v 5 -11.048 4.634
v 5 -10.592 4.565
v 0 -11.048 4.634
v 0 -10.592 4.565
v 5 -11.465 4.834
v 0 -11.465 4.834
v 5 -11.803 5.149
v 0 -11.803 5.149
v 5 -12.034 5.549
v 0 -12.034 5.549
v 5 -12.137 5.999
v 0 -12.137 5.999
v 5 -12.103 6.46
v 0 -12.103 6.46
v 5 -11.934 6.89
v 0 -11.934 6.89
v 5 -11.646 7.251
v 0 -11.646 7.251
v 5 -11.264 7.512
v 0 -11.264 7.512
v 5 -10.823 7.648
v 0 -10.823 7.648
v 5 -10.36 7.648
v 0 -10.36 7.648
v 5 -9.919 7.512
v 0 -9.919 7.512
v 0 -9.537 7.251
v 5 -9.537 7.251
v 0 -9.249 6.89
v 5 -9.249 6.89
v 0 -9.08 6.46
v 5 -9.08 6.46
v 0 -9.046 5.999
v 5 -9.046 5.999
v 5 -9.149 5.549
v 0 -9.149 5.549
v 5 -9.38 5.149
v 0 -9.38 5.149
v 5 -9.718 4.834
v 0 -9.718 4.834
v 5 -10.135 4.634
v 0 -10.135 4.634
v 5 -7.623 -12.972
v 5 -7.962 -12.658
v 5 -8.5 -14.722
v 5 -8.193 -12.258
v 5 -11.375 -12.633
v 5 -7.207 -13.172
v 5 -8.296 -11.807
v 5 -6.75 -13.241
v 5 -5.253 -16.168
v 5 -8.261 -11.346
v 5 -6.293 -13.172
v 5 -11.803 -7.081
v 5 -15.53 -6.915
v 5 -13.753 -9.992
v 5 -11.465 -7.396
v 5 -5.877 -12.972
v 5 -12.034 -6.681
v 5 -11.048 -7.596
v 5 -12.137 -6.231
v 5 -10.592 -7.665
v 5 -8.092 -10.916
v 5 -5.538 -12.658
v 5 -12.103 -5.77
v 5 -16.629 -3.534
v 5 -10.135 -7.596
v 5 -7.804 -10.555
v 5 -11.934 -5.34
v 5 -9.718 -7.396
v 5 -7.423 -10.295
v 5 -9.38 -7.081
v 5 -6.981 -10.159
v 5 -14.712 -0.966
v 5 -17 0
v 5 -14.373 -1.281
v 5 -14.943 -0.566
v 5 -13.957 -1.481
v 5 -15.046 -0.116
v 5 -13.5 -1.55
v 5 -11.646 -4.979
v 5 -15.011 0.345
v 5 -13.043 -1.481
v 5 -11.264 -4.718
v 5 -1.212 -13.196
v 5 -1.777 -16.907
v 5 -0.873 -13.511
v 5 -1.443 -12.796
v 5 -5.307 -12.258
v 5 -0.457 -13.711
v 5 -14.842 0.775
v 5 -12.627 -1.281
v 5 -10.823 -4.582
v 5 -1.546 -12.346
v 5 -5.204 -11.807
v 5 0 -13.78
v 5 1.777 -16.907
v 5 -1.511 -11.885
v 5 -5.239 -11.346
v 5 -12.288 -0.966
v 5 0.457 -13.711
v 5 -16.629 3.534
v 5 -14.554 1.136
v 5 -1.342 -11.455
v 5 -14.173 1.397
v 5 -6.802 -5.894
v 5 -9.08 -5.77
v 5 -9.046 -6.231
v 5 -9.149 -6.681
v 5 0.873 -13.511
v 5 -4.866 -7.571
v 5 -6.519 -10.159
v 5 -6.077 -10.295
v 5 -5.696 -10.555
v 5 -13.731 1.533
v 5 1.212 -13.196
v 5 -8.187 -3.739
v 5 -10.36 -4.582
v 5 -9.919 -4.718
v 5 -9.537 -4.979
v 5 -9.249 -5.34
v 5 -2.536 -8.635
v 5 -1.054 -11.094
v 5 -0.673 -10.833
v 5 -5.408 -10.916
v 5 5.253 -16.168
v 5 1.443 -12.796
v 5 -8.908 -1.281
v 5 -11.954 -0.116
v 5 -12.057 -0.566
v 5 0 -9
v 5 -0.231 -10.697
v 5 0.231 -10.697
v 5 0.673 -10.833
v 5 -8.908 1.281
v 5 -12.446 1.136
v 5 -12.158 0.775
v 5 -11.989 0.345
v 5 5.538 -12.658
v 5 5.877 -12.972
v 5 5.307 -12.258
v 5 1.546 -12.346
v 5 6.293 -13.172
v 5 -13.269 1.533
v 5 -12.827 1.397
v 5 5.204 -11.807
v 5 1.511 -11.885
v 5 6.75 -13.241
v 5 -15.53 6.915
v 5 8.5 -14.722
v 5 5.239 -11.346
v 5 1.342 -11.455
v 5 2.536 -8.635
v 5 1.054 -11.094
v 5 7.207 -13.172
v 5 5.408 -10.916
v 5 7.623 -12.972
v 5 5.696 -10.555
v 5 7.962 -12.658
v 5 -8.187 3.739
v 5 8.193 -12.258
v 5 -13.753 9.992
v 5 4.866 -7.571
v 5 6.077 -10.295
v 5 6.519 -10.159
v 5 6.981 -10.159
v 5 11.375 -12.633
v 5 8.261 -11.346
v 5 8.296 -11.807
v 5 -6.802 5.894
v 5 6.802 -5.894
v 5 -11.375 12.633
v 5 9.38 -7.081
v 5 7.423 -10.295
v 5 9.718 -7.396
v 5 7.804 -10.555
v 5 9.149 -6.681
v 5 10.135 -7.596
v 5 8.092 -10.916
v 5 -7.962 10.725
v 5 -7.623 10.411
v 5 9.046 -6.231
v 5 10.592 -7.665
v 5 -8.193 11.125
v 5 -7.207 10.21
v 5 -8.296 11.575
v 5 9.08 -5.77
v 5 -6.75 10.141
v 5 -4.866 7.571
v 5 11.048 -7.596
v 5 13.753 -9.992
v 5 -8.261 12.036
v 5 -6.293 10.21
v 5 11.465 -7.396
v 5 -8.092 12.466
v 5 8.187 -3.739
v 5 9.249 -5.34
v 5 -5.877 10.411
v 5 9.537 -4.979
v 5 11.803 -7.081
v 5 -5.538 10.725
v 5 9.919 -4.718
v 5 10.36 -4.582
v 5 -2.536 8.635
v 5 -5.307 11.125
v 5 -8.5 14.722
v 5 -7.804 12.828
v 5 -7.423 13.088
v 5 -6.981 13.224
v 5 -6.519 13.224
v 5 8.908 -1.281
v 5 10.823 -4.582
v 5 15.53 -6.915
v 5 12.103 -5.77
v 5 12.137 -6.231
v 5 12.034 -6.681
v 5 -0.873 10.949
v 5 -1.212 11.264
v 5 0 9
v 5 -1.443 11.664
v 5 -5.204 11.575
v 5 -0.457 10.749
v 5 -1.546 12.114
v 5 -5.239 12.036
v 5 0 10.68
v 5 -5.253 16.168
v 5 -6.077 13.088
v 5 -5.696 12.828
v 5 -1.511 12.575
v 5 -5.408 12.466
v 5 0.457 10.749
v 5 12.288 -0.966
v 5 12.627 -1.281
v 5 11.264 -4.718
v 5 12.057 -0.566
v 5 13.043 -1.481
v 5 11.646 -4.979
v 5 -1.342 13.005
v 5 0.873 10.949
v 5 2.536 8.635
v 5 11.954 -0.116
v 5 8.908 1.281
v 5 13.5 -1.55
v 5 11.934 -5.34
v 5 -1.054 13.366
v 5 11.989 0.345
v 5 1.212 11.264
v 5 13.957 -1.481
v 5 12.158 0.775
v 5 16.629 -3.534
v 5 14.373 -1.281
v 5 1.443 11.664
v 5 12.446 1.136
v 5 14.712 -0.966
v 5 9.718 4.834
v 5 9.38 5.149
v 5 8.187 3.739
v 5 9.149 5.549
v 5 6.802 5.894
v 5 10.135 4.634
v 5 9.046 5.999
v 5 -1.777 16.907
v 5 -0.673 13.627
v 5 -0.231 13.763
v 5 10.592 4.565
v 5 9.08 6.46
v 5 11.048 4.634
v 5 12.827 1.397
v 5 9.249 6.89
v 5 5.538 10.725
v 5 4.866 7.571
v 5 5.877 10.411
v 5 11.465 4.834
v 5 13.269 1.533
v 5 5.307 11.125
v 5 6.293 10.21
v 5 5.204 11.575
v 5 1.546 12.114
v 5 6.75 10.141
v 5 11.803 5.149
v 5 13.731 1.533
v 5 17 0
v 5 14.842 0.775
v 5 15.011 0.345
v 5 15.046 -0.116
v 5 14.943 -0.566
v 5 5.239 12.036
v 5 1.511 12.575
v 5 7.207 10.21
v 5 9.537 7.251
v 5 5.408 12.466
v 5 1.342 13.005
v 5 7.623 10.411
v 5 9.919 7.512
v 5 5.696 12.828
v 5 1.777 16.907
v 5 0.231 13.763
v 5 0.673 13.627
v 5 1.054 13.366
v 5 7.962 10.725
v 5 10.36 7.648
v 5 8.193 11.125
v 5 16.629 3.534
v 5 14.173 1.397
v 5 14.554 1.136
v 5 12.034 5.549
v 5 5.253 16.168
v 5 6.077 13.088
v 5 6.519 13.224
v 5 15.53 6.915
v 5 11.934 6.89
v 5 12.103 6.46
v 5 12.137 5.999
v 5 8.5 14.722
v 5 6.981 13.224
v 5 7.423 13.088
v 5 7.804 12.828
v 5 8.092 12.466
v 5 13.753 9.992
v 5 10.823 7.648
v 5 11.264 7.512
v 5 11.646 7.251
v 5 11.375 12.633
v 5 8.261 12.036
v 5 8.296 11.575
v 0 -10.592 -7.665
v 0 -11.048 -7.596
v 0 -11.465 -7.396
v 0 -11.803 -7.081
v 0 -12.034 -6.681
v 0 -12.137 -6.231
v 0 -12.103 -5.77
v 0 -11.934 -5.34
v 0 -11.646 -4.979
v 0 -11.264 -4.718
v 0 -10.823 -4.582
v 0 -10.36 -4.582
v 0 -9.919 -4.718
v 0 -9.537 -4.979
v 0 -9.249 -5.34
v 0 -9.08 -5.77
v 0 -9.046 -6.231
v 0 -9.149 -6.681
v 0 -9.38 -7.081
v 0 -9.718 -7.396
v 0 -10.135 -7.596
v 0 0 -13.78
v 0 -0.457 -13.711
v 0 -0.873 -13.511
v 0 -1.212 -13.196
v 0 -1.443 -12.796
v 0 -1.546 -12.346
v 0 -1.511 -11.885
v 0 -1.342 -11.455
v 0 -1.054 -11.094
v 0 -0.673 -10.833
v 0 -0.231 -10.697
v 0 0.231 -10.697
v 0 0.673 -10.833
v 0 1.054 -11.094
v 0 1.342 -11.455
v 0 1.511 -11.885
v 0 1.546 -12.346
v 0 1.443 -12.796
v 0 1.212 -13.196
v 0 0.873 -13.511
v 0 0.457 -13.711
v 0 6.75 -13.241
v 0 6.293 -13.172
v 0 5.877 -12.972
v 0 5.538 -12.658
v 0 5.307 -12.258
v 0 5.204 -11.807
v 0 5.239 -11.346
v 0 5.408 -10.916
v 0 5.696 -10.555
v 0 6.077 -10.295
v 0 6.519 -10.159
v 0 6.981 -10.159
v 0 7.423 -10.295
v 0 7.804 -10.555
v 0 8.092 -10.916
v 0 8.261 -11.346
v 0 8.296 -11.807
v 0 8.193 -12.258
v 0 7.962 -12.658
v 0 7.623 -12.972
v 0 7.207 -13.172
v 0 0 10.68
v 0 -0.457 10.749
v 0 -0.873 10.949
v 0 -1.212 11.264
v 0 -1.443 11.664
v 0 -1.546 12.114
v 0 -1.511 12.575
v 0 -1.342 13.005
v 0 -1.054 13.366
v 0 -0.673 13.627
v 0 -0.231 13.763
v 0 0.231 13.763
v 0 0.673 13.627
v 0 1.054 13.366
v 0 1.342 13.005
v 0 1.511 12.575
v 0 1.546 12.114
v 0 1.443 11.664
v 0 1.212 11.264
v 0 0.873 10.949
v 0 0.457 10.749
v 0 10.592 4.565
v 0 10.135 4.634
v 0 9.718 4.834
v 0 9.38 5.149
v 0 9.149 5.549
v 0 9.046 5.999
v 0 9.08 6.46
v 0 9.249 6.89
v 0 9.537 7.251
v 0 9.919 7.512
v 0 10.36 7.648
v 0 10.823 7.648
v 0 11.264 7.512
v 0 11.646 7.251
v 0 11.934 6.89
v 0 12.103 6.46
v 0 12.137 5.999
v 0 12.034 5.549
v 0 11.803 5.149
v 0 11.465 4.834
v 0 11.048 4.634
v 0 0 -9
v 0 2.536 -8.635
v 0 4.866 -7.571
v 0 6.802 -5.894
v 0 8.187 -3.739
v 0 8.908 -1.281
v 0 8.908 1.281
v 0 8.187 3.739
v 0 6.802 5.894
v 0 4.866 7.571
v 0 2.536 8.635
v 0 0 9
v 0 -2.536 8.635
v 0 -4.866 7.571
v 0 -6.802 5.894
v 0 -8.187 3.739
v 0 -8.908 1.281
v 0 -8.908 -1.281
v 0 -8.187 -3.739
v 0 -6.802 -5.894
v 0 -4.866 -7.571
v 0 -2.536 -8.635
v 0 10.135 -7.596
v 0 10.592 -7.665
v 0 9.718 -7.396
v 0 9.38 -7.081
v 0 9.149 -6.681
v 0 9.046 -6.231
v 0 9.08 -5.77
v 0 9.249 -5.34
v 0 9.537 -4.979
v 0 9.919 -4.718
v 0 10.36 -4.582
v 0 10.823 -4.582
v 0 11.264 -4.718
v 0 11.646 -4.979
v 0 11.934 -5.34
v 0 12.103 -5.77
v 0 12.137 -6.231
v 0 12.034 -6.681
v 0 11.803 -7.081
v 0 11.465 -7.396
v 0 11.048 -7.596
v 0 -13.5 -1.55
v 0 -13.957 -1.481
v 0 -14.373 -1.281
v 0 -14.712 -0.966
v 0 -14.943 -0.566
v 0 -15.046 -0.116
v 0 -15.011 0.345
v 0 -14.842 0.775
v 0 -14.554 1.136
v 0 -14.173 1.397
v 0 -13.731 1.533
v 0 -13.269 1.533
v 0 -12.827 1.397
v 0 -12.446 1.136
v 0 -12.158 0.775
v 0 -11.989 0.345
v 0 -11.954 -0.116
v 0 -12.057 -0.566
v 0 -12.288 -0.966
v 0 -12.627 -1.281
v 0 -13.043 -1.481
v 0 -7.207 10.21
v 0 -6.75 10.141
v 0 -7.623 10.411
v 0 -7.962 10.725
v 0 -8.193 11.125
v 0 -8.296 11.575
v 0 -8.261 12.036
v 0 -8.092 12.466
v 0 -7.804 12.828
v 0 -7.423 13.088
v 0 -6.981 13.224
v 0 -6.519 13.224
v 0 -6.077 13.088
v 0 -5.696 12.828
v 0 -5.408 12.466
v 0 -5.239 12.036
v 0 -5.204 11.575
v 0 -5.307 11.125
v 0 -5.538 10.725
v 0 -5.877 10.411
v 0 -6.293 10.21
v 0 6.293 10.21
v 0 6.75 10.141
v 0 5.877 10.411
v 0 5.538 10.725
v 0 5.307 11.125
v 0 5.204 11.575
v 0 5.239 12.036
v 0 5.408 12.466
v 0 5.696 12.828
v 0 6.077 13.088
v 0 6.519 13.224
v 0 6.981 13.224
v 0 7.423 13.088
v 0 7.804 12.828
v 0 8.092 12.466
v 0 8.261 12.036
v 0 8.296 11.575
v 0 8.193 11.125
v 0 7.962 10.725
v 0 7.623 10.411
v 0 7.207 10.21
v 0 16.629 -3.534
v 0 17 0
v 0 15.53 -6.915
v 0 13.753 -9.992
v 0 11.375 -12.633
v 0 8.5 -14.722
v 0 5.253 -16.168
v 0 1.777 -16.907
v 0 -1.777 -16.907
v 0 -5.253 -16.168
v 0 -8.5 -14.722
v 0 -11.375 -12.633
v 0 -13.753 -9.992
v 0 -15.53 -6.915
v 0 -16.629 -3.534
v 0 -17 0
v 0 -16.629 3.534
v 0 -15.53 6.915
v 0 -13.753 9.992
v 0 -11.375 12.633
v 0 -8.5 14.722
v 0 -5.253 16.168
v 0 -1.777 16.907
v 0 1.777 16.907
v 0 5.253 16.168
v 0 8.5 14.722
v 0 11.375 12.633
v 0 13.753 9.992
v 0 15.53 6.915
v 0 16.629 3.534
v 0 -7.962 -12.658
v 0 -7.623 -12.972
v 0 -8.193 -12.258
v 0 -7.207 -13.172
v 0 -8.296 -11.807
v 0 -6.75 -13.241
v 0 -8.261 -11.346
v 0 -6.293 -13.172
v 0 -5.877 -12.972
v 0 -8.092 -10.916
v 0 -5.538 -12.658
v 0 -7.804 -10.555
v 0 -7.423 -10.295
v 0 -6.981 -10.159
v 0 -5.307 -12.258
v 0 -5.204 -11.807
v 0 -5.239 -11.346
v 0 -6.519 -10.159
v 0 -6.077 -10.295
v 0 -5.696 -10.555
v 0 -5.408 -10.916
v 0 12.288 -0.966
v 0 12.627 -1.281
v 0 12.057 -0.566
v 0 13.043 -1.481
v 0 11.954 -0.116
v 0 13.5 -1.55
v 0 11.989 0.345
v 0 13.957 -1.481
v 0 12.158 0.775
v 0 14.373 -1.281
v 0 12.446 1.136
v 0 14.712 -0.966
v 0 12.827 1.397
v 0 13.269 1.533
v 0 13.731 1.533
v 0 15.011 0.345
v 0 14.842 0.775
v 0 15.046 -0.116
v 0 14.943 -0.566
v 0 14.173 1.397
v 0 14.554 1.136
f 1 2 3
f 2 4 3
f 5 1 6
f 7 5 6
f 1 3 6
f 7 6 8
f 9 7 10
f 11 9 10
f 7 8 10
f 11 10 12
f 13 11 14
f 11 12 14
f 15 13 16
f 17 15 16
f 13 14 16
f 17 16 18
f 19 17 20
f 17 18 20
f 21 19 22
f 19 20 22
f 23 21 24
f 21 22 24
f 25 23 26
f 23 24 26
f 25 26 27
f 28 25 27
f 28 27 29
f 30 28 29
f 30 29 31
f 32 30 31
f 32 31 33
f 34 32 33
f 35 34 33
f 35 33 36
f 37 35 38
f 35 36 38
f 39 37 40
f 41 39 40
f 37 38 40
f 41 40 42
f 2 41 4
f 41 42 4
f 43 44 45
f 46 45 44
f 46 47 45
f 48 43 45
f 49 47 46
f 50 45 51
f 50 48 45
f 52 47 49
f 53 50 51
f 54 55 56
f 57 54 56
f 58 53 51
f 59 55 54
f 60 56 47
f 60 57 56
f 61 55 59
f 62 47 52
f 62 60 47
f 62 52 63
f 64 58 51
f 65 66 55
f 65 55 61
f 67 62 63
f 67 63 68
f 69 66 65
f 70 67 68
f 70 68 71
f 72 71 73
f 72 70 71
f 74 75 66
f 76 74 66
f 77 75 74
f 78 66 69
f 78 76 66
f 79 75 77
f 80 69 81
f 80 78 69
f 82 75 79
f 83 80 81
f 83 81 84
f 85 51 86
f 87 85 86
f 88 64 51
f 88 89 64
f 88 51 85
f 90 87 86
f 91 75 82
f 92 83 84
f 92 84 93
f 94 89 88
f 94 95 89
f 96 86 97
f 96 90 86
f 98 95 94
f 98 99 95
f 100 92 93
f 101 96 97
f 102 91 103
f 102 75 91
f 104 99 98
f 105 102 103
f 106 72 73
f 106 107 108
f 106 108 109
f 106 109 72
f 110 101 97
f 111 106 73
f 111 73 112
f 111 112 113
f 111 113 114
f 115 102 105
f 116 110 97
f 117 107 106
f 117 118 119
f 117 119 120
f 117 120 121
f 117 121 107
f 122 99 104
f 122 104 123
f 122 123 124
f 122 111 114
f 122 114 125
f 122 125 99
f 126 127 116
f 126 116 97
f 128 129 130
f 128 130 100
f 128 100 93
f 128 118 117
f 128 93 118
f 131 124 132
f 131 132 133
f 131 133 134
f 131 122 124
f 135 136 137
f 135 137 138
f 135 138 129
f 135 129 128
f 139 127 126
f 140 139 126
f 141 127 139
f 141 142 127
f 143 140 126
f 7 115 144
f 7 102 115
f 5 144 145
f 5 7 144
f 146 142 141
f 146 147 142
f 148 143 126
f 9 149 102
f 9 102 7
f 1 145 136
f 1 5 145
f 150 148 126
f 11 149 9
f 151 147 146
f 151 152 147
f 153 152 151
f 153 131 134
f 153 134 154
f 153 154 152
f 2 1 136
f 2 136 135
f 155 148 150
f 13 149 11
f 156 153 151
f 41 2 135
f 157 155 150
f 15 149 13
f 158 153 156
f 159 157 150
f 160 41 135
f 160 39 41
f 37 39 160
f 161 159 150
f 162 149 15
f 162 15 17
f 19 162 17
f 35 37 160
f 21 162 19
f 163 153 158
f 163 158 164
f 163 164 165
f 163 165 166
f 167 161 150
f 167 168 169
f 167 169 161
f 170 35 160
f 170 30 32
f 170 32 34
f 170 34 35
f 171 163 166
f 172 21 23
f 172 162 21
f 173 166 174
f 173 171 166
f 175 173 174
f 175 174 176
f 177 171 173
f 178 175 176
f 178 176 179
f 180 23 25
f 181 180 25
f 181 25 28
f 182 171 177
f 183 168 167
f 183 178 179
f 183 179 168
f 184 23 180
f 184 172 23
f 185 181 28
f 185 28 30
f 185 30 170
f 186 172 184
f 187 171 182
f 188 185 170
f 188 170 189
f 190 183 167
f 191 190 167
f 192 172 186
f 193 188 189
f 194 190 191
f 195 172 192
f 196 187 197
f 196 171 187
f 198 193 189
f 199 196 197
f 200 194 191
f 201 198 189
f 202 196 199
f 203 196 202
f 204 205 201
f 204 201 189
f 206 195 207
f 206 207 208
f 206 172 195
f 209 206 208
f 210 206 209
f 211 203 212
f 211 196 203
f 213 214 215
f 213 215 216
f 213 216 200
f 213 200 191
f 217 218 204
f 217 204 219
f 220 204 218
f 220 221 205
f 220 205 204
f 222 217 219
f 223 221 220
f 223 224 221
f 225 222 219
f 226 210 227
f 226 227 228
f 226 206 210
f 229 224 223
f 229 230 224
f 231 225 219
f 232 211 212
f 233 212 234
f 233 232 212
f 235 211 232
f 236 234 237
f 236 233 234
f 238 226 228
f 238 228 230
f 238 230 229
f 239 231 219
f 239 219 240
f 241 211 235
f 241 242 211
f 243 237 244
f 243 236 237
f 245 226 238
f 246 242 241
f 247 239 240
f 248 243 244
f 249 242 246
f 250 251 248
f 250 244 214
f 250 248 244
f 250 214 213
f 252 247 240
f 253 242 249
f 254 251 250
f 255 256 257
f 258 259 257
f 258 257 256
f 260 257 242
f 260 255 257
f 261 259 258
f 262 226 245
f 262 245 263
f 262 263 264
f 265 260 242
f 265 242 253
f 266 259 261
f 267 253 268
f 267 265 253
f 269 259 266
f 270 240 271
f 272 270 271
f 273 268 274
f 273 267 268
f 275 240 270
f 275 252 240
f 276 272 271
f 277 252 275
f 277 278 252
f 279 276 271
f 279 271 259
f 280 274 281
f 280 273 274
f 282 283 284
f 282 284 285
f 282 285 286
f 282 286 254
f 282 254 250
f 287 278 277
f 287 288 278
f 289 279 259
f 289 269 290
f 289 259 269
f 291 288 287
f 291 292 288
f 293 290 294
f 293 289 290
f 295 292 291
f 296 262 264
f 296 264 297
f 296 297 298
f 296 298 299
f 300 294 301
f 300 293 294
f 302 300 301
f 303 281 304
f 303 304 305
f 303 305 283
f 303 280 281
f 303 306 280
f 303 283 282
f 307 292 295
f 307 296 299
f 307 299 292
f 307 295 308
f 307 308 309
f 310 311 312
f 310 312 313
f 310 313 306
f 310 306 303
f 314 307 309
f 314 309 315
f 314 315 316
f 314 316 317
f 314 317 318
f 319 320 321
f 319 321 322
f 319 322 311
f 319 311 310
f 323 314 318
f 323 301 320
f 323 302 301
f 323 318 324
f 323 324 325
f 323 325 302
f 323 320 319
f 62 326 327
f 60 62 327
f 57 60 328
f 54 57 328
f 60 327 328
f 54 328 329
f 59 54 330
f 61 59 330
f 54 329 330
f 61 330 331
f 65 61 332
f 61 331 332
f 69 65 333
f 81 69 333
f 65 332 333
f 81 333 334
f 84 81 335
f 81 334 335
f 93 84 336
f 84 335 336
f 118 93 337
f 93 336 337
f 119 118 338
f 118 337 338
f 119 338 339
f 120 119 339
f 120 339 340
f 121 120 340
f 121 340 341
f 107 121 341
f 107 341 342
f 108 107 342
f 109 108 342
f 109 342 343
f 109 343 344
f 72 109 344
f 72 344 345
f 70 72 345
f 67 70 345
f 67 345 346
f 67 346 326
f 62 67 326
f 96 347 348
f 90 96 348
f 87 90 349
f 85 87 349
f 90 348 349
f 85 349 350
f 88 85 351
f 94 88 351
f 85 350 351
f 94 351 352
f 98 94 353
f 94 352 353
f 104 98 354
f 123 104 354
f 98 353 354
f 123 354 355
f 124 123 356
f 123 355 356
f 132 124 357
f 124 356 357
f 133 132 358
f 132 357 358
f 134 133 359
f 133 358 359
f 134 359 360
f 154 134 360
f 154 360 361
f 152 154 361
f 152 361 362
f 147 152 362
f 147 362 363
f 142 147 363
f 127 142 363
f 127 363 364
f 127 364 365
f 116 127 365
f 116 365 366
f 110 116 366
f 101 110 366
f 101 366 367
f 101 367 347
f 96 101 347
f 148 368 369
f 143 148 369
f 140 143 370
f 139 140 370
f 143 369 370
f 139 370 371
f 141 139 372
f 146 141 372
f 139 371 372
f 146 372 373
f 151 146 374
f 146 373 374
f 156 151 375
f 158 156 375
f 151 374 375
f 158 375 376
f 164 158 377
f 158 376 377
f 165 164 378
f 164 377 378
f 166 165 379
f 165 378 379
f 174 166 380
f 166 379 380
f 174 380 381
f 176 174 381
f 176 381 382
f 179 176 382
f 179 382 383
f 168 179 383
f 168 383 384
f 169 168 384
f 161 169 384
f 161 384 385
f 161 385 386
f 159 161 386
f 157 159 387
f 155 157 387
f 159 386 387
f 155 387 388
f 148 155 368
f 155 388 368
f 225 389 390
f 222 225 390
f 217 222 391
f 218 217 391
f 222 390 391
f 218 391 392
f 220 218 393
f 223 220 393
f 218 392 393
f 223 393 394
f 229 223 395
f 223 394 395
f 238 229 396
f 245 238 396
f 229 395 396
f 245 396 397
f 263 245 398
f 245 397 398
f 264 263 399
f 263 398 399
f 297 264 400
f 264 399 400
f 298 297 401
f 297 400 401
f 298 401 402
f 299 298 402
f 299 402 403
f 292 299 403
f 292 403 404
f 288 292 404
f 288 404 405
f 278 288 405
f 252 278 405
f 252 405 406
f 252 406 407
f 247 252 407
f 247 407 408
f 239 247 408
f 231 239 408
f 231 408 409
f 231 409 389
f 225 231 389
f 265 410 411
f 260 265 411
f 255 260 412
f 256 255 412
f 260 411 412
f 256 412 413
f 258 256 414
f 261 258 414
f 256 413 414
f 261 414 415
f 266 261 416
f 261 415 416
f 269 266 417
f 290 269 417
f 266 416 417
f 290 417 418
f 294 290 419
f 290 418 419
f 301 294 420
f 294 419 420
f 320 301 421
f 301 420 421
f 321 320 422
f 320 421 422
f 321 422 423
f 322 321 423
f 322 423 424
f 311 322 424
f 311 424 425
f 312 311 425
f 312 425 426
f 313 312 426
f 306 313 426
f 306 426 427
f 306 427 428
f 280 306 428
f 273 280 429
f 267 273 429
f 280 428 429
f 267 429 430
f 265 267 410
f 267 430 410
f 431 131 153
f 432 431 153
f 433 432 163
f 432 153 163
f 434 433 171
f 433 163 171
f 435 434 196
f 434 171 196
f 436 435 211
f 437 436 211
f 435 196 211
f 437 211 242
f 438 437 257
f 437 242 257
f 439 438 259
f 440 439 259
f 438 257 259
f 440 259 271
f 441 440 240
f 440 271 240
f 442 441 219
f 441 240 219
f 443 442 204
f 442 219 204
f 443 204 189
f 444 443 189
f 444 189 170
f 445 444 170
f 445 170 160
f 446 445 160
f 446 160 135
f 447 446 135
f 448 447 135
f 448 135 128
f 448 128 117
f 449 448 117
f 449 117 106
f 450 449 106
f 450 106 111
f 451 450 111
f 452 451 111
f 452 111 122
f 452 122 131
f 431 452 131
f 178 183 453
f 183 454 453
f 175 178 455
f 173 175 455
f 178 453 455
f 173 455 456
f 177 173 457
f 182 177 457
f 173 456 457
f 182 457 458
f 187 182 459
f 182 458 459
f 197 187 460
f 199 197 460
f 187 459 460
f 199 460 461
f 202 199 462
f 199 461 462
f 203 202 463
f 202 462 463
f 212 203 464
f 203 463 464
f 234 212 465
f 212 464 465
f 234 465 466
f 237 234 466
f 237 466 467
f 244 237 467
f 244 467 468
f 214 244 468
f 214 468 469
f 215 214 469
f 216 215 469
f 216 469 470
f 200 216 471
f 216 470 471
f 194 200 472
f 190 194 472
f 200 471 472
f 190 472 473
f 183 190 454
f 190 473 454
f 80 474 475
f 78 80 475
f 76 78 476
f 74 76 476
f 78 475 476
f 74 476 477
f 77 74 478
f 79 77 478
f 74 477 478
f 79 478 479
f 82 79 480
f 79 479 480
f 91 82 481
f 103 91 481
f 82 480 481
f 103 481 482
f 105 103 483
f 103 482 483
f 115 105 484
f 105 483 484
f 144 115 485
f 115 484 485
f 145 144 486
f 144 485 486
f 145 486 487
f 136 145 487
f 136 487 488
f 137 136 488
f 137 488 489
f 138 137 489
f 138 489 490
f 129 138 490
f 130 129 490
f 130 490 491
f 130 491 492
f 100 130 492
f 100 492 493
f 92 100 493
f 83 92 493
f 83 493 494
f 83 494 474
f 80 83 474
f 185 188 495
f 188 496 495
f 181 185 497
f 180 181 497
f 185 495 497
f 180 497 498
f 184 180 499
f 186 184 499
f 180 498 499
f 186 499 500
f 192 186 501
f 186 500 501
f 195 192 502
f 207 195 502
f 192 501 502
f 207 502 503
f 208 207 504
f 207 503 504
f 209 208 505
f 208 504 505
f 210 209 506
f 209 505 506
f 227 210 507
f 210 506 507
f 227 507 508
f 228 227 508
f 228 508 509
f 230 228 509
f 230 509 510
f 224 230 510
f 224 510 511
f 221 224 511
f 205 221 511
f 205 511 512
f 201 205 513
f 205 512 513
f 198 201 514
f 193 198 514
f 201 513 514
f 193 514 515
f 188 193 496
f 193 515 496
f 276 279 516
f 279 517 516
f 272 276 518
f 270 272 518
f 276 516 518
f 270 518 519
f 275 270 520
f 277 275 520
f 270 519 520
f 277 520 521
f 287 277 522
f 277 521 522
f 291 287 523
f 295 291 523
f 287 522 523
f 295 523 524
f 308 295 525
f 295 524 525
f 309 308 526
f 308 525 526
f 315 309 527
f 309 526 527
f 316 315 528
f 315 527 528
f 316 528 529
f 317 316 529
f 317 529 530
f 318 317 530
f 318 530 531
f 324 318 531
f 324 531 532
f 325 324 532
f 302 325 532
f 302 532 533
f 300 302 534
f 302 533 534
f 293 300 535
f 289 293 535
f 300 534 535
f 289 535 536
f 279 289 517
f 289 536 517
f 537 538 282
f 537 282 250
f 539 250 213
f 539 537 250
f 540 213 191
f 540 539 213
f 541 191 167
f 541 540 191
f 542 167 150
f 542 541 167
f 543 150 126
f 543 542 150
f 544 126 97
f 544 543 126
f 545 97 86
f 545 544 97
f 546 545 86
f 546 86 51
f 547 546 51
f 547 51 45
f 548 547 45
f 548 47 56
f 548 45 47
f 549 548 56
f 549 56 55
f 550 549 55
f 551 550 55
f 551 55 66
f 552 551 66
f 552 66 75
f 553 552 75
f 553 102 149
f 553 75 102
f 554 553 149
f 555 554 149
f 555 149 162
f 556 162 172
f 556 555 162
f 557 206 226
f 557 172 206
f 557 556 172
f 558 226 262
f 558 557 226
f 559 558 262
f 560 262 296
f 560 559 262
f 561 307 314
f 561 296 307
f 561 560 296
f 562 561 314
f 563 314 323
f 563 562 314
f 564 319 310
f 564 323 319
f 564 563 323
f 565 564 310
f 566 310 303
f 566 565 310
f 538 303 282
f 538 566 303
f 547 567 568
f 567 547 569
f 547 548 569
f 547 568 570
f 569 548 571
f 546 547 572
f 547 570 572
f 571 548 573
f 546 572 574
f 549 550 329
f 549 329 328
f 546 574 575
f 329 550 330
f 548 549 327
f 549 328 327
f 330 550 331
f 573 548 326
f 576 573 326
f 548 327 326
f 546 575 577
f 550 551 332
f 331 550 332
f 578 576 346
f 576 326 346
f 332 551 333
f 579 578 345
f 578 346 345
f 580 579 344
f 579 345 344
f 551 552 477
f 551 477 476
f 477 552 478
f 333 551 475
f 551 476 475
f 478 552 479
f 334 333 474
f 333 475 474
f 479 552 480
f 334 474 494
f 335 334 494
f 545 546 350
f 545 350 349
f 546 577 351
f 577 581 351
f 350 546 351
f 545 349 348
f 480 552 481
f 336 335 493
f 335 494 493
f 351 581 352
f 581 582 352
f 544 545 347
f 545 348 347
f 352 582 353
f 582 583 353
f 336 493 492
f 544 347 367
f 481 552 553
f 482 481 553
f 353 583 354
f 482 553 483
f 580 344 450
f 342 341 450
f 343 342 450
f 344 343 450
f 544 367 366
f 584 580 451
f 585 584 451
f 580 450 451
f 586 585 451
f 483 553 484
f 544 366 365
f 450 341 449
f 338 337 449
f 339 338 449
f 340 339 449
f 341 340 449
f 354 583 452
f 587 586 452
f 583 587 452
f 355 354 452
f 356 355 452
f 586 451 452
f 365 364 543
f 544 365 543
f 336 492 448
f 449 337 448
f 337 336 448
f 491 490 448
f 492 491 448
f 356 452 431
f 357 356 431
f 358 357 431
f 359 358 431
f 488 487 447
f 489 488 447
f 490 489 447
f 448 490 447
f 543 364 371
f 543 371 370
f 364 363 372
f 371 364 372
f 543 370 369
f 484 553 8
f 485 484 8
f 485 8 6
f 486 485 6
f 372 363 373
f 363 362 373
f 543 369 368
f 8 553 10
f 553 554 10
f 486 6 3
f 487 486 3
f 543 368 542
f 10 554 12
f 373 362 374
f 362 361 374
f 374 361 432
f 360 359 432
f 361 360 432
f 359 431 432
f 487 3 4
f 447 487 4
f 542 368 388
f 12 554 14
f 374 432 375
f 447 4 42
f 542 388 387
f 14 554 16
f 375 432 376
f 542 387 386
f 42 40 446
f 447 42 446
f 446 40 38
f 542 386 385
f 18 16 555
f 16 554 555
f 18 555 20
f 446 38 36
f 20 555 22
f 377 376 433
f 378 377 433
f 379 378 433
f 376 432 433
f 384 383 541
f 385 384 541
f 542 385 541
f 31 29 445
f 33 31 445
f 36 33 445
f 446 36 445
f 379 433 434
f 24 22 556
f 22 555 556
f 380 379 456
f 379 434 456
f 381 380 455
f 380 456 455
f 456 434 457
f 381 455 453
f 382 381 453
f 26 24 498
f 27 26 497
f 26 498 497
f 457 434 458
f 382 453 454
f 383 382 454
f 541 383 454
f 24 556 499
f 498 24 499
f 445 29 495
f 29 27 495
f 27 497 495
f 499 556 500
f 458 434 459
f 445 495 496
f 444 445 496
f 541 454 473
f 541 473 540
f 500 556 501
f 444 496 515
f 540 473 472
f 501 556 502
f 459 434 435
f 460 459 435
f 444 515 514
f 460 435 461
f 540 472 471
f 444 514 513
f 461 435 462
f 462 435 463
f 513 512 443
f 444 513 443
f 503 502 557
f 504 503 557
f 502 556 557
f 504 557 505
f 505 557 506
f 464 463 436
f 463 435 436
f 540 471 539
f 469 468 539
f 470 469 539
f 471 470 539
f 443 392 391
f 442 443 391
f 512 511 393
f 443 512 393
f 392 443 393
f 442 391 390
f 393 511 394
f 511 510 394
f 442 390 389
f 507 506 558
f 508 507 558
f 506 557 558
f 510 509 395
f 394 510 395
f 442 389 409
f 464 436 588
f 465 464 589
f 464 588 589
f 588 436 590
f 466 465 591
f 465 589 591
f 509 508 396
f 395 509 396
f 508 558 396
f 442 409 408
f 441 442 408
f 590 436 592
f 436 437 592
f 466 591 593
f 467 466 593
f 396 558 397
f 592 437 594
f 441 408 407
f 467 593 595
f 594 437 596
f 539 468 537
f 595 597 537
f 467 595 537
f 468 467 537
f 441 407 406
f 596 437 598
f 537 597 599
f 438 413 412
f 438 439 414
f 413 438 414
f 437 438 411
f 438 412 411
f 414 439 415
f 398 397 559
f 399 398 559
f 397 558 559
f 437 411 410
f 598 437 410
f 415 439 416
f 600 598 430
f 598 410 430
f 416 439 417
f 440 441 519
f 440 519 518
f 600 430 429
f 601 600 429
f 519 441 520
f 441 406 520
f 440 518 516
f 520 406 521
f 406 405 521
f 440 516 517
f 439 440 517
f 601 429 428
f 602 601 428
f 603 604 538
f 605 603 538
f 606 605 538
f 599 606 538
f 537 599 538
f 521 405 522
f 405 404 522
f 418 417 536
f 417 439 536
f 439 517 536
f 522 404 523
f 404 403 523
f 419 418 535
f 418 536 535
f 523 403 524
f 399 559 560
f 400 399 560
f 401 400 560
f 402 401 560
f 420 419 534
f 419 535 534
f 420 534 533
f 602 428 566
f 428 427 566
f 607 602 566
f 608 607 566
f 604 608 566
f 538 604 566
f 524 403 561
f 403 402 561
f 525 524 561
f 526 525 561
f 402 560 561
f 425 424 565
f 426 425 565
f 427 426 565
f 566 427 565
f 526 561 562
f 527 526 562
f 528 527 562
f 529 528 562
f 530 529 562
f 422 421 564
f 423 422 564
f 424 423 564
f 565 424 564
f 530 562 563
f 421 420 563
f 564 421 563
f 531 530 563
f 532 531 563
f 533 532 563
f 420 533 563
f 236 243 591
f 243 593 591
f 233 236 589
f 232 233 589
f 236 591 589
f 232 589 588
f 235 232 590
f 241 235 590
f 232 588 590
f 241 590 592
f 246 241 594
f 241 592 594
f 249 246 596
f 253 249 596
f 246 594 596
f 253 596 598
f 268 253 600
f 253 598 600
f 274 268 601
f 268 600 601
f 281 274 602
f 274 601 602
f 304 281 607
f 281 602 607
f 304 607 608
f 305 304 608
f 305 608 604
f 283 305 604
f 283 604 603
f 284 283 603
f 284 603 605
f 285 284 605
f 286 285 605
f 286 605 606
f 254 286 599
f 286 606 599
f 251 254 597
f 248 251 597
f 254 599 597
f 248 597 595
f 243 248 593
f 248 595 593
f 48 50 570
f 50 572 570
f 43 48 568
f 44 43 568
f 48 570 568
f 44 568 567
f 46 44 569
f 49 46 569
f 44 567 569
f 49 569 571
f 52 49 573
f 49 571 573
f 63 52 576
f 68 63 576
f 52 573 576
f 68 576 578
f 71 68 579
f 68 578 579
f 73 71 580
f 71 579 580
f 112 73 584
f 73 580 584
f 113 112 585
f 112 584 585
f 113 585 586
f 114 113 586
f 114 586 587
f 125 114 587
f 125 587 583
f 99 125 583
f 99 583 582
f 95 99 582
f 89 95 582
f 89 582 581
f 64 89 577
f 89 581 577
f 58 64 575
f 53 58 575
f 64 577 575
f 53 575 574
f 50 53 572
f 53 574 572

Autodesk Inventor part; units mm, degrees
ref_plane "YZ Plane" through (0, 0, 0) normal (1, 0, 0) x (0, 1, 0)
ref_plane "XZ Plane" through (0, 0, 0) normal (0, 1, 0) x (-1, 0, 0)
ref_plane "XY Plane" through (0, 0, 0) normal (0, 0, 1) x (1, 0, 0)
sketch "スケッチ1" plane through (0, 0, 0) normal (1, 0, 0) x (0, 1, 0)
  circle A0 centre (0, 0) radius 17
  dimension "d0" = 34
extrude "押し出し1" add sketch "スケッチ1" along normal blind 5
sketch "スケッチ2" plane through (5, 0, 0) normal (1, 0, 0) x (0, 0, -1)
  circle A0 centre (0, 0) radius 13.5
  circle A1 centre (0, 0) radius 12.23
  line L0 (0, 0) -> (0, 13.5)
  line L1 (0, 0) -> (6.115, 10.5915)
  point P0 (-11.6913, 6.75)
  point P1 (-11.6913, -6.75)
  point P2 (0, -13.5)
  point P3 (11.6913, -6.75)
  point P4 (11.6913, 6.75)
  point P5 (-6.115, 10.5915)
  point P6 (-12.23, 0)
  point P7 (-6.115, -10.5915)
  point P8 (6.115, -10.5915)
  point P9 (12.23, 0)
  dimension "d3" = 27
  dimension "d4" = 24.46
  dimension "d5" = 30
  dimension "d8" = 360
  dimension "d12" = 360
hole "穴1" at (5, 13.5, 0) at (5, 6.75, 11.6913) at (5, -6.75, 11.6913) at (5, -13.5, 0) at (5, -6.75, -11.6913) at (5, 6.75, -11.6913) at (5, 10.5915, -6.115) at (5, 10.5915, 6.115) at (5, 0, 12.23) at (5, -10.5915, 6.115) at (5, 0, -12.23) at (5, -10.5915, -6.115) direction (-1, 0, 0) diameter 3.1 end through all
sketch "スケッチ3" plane through (5, 0, 0) normal (1, 0, 0) x (0, 0, -1)
  circle A0 centre (0, 0) radius 9
  dimension "d21" = 18
extrude "押し出し2" cut sketch "スケッチ3" against normal blind 5
properties part number "link2part6" material "アルミニウム 6061"
